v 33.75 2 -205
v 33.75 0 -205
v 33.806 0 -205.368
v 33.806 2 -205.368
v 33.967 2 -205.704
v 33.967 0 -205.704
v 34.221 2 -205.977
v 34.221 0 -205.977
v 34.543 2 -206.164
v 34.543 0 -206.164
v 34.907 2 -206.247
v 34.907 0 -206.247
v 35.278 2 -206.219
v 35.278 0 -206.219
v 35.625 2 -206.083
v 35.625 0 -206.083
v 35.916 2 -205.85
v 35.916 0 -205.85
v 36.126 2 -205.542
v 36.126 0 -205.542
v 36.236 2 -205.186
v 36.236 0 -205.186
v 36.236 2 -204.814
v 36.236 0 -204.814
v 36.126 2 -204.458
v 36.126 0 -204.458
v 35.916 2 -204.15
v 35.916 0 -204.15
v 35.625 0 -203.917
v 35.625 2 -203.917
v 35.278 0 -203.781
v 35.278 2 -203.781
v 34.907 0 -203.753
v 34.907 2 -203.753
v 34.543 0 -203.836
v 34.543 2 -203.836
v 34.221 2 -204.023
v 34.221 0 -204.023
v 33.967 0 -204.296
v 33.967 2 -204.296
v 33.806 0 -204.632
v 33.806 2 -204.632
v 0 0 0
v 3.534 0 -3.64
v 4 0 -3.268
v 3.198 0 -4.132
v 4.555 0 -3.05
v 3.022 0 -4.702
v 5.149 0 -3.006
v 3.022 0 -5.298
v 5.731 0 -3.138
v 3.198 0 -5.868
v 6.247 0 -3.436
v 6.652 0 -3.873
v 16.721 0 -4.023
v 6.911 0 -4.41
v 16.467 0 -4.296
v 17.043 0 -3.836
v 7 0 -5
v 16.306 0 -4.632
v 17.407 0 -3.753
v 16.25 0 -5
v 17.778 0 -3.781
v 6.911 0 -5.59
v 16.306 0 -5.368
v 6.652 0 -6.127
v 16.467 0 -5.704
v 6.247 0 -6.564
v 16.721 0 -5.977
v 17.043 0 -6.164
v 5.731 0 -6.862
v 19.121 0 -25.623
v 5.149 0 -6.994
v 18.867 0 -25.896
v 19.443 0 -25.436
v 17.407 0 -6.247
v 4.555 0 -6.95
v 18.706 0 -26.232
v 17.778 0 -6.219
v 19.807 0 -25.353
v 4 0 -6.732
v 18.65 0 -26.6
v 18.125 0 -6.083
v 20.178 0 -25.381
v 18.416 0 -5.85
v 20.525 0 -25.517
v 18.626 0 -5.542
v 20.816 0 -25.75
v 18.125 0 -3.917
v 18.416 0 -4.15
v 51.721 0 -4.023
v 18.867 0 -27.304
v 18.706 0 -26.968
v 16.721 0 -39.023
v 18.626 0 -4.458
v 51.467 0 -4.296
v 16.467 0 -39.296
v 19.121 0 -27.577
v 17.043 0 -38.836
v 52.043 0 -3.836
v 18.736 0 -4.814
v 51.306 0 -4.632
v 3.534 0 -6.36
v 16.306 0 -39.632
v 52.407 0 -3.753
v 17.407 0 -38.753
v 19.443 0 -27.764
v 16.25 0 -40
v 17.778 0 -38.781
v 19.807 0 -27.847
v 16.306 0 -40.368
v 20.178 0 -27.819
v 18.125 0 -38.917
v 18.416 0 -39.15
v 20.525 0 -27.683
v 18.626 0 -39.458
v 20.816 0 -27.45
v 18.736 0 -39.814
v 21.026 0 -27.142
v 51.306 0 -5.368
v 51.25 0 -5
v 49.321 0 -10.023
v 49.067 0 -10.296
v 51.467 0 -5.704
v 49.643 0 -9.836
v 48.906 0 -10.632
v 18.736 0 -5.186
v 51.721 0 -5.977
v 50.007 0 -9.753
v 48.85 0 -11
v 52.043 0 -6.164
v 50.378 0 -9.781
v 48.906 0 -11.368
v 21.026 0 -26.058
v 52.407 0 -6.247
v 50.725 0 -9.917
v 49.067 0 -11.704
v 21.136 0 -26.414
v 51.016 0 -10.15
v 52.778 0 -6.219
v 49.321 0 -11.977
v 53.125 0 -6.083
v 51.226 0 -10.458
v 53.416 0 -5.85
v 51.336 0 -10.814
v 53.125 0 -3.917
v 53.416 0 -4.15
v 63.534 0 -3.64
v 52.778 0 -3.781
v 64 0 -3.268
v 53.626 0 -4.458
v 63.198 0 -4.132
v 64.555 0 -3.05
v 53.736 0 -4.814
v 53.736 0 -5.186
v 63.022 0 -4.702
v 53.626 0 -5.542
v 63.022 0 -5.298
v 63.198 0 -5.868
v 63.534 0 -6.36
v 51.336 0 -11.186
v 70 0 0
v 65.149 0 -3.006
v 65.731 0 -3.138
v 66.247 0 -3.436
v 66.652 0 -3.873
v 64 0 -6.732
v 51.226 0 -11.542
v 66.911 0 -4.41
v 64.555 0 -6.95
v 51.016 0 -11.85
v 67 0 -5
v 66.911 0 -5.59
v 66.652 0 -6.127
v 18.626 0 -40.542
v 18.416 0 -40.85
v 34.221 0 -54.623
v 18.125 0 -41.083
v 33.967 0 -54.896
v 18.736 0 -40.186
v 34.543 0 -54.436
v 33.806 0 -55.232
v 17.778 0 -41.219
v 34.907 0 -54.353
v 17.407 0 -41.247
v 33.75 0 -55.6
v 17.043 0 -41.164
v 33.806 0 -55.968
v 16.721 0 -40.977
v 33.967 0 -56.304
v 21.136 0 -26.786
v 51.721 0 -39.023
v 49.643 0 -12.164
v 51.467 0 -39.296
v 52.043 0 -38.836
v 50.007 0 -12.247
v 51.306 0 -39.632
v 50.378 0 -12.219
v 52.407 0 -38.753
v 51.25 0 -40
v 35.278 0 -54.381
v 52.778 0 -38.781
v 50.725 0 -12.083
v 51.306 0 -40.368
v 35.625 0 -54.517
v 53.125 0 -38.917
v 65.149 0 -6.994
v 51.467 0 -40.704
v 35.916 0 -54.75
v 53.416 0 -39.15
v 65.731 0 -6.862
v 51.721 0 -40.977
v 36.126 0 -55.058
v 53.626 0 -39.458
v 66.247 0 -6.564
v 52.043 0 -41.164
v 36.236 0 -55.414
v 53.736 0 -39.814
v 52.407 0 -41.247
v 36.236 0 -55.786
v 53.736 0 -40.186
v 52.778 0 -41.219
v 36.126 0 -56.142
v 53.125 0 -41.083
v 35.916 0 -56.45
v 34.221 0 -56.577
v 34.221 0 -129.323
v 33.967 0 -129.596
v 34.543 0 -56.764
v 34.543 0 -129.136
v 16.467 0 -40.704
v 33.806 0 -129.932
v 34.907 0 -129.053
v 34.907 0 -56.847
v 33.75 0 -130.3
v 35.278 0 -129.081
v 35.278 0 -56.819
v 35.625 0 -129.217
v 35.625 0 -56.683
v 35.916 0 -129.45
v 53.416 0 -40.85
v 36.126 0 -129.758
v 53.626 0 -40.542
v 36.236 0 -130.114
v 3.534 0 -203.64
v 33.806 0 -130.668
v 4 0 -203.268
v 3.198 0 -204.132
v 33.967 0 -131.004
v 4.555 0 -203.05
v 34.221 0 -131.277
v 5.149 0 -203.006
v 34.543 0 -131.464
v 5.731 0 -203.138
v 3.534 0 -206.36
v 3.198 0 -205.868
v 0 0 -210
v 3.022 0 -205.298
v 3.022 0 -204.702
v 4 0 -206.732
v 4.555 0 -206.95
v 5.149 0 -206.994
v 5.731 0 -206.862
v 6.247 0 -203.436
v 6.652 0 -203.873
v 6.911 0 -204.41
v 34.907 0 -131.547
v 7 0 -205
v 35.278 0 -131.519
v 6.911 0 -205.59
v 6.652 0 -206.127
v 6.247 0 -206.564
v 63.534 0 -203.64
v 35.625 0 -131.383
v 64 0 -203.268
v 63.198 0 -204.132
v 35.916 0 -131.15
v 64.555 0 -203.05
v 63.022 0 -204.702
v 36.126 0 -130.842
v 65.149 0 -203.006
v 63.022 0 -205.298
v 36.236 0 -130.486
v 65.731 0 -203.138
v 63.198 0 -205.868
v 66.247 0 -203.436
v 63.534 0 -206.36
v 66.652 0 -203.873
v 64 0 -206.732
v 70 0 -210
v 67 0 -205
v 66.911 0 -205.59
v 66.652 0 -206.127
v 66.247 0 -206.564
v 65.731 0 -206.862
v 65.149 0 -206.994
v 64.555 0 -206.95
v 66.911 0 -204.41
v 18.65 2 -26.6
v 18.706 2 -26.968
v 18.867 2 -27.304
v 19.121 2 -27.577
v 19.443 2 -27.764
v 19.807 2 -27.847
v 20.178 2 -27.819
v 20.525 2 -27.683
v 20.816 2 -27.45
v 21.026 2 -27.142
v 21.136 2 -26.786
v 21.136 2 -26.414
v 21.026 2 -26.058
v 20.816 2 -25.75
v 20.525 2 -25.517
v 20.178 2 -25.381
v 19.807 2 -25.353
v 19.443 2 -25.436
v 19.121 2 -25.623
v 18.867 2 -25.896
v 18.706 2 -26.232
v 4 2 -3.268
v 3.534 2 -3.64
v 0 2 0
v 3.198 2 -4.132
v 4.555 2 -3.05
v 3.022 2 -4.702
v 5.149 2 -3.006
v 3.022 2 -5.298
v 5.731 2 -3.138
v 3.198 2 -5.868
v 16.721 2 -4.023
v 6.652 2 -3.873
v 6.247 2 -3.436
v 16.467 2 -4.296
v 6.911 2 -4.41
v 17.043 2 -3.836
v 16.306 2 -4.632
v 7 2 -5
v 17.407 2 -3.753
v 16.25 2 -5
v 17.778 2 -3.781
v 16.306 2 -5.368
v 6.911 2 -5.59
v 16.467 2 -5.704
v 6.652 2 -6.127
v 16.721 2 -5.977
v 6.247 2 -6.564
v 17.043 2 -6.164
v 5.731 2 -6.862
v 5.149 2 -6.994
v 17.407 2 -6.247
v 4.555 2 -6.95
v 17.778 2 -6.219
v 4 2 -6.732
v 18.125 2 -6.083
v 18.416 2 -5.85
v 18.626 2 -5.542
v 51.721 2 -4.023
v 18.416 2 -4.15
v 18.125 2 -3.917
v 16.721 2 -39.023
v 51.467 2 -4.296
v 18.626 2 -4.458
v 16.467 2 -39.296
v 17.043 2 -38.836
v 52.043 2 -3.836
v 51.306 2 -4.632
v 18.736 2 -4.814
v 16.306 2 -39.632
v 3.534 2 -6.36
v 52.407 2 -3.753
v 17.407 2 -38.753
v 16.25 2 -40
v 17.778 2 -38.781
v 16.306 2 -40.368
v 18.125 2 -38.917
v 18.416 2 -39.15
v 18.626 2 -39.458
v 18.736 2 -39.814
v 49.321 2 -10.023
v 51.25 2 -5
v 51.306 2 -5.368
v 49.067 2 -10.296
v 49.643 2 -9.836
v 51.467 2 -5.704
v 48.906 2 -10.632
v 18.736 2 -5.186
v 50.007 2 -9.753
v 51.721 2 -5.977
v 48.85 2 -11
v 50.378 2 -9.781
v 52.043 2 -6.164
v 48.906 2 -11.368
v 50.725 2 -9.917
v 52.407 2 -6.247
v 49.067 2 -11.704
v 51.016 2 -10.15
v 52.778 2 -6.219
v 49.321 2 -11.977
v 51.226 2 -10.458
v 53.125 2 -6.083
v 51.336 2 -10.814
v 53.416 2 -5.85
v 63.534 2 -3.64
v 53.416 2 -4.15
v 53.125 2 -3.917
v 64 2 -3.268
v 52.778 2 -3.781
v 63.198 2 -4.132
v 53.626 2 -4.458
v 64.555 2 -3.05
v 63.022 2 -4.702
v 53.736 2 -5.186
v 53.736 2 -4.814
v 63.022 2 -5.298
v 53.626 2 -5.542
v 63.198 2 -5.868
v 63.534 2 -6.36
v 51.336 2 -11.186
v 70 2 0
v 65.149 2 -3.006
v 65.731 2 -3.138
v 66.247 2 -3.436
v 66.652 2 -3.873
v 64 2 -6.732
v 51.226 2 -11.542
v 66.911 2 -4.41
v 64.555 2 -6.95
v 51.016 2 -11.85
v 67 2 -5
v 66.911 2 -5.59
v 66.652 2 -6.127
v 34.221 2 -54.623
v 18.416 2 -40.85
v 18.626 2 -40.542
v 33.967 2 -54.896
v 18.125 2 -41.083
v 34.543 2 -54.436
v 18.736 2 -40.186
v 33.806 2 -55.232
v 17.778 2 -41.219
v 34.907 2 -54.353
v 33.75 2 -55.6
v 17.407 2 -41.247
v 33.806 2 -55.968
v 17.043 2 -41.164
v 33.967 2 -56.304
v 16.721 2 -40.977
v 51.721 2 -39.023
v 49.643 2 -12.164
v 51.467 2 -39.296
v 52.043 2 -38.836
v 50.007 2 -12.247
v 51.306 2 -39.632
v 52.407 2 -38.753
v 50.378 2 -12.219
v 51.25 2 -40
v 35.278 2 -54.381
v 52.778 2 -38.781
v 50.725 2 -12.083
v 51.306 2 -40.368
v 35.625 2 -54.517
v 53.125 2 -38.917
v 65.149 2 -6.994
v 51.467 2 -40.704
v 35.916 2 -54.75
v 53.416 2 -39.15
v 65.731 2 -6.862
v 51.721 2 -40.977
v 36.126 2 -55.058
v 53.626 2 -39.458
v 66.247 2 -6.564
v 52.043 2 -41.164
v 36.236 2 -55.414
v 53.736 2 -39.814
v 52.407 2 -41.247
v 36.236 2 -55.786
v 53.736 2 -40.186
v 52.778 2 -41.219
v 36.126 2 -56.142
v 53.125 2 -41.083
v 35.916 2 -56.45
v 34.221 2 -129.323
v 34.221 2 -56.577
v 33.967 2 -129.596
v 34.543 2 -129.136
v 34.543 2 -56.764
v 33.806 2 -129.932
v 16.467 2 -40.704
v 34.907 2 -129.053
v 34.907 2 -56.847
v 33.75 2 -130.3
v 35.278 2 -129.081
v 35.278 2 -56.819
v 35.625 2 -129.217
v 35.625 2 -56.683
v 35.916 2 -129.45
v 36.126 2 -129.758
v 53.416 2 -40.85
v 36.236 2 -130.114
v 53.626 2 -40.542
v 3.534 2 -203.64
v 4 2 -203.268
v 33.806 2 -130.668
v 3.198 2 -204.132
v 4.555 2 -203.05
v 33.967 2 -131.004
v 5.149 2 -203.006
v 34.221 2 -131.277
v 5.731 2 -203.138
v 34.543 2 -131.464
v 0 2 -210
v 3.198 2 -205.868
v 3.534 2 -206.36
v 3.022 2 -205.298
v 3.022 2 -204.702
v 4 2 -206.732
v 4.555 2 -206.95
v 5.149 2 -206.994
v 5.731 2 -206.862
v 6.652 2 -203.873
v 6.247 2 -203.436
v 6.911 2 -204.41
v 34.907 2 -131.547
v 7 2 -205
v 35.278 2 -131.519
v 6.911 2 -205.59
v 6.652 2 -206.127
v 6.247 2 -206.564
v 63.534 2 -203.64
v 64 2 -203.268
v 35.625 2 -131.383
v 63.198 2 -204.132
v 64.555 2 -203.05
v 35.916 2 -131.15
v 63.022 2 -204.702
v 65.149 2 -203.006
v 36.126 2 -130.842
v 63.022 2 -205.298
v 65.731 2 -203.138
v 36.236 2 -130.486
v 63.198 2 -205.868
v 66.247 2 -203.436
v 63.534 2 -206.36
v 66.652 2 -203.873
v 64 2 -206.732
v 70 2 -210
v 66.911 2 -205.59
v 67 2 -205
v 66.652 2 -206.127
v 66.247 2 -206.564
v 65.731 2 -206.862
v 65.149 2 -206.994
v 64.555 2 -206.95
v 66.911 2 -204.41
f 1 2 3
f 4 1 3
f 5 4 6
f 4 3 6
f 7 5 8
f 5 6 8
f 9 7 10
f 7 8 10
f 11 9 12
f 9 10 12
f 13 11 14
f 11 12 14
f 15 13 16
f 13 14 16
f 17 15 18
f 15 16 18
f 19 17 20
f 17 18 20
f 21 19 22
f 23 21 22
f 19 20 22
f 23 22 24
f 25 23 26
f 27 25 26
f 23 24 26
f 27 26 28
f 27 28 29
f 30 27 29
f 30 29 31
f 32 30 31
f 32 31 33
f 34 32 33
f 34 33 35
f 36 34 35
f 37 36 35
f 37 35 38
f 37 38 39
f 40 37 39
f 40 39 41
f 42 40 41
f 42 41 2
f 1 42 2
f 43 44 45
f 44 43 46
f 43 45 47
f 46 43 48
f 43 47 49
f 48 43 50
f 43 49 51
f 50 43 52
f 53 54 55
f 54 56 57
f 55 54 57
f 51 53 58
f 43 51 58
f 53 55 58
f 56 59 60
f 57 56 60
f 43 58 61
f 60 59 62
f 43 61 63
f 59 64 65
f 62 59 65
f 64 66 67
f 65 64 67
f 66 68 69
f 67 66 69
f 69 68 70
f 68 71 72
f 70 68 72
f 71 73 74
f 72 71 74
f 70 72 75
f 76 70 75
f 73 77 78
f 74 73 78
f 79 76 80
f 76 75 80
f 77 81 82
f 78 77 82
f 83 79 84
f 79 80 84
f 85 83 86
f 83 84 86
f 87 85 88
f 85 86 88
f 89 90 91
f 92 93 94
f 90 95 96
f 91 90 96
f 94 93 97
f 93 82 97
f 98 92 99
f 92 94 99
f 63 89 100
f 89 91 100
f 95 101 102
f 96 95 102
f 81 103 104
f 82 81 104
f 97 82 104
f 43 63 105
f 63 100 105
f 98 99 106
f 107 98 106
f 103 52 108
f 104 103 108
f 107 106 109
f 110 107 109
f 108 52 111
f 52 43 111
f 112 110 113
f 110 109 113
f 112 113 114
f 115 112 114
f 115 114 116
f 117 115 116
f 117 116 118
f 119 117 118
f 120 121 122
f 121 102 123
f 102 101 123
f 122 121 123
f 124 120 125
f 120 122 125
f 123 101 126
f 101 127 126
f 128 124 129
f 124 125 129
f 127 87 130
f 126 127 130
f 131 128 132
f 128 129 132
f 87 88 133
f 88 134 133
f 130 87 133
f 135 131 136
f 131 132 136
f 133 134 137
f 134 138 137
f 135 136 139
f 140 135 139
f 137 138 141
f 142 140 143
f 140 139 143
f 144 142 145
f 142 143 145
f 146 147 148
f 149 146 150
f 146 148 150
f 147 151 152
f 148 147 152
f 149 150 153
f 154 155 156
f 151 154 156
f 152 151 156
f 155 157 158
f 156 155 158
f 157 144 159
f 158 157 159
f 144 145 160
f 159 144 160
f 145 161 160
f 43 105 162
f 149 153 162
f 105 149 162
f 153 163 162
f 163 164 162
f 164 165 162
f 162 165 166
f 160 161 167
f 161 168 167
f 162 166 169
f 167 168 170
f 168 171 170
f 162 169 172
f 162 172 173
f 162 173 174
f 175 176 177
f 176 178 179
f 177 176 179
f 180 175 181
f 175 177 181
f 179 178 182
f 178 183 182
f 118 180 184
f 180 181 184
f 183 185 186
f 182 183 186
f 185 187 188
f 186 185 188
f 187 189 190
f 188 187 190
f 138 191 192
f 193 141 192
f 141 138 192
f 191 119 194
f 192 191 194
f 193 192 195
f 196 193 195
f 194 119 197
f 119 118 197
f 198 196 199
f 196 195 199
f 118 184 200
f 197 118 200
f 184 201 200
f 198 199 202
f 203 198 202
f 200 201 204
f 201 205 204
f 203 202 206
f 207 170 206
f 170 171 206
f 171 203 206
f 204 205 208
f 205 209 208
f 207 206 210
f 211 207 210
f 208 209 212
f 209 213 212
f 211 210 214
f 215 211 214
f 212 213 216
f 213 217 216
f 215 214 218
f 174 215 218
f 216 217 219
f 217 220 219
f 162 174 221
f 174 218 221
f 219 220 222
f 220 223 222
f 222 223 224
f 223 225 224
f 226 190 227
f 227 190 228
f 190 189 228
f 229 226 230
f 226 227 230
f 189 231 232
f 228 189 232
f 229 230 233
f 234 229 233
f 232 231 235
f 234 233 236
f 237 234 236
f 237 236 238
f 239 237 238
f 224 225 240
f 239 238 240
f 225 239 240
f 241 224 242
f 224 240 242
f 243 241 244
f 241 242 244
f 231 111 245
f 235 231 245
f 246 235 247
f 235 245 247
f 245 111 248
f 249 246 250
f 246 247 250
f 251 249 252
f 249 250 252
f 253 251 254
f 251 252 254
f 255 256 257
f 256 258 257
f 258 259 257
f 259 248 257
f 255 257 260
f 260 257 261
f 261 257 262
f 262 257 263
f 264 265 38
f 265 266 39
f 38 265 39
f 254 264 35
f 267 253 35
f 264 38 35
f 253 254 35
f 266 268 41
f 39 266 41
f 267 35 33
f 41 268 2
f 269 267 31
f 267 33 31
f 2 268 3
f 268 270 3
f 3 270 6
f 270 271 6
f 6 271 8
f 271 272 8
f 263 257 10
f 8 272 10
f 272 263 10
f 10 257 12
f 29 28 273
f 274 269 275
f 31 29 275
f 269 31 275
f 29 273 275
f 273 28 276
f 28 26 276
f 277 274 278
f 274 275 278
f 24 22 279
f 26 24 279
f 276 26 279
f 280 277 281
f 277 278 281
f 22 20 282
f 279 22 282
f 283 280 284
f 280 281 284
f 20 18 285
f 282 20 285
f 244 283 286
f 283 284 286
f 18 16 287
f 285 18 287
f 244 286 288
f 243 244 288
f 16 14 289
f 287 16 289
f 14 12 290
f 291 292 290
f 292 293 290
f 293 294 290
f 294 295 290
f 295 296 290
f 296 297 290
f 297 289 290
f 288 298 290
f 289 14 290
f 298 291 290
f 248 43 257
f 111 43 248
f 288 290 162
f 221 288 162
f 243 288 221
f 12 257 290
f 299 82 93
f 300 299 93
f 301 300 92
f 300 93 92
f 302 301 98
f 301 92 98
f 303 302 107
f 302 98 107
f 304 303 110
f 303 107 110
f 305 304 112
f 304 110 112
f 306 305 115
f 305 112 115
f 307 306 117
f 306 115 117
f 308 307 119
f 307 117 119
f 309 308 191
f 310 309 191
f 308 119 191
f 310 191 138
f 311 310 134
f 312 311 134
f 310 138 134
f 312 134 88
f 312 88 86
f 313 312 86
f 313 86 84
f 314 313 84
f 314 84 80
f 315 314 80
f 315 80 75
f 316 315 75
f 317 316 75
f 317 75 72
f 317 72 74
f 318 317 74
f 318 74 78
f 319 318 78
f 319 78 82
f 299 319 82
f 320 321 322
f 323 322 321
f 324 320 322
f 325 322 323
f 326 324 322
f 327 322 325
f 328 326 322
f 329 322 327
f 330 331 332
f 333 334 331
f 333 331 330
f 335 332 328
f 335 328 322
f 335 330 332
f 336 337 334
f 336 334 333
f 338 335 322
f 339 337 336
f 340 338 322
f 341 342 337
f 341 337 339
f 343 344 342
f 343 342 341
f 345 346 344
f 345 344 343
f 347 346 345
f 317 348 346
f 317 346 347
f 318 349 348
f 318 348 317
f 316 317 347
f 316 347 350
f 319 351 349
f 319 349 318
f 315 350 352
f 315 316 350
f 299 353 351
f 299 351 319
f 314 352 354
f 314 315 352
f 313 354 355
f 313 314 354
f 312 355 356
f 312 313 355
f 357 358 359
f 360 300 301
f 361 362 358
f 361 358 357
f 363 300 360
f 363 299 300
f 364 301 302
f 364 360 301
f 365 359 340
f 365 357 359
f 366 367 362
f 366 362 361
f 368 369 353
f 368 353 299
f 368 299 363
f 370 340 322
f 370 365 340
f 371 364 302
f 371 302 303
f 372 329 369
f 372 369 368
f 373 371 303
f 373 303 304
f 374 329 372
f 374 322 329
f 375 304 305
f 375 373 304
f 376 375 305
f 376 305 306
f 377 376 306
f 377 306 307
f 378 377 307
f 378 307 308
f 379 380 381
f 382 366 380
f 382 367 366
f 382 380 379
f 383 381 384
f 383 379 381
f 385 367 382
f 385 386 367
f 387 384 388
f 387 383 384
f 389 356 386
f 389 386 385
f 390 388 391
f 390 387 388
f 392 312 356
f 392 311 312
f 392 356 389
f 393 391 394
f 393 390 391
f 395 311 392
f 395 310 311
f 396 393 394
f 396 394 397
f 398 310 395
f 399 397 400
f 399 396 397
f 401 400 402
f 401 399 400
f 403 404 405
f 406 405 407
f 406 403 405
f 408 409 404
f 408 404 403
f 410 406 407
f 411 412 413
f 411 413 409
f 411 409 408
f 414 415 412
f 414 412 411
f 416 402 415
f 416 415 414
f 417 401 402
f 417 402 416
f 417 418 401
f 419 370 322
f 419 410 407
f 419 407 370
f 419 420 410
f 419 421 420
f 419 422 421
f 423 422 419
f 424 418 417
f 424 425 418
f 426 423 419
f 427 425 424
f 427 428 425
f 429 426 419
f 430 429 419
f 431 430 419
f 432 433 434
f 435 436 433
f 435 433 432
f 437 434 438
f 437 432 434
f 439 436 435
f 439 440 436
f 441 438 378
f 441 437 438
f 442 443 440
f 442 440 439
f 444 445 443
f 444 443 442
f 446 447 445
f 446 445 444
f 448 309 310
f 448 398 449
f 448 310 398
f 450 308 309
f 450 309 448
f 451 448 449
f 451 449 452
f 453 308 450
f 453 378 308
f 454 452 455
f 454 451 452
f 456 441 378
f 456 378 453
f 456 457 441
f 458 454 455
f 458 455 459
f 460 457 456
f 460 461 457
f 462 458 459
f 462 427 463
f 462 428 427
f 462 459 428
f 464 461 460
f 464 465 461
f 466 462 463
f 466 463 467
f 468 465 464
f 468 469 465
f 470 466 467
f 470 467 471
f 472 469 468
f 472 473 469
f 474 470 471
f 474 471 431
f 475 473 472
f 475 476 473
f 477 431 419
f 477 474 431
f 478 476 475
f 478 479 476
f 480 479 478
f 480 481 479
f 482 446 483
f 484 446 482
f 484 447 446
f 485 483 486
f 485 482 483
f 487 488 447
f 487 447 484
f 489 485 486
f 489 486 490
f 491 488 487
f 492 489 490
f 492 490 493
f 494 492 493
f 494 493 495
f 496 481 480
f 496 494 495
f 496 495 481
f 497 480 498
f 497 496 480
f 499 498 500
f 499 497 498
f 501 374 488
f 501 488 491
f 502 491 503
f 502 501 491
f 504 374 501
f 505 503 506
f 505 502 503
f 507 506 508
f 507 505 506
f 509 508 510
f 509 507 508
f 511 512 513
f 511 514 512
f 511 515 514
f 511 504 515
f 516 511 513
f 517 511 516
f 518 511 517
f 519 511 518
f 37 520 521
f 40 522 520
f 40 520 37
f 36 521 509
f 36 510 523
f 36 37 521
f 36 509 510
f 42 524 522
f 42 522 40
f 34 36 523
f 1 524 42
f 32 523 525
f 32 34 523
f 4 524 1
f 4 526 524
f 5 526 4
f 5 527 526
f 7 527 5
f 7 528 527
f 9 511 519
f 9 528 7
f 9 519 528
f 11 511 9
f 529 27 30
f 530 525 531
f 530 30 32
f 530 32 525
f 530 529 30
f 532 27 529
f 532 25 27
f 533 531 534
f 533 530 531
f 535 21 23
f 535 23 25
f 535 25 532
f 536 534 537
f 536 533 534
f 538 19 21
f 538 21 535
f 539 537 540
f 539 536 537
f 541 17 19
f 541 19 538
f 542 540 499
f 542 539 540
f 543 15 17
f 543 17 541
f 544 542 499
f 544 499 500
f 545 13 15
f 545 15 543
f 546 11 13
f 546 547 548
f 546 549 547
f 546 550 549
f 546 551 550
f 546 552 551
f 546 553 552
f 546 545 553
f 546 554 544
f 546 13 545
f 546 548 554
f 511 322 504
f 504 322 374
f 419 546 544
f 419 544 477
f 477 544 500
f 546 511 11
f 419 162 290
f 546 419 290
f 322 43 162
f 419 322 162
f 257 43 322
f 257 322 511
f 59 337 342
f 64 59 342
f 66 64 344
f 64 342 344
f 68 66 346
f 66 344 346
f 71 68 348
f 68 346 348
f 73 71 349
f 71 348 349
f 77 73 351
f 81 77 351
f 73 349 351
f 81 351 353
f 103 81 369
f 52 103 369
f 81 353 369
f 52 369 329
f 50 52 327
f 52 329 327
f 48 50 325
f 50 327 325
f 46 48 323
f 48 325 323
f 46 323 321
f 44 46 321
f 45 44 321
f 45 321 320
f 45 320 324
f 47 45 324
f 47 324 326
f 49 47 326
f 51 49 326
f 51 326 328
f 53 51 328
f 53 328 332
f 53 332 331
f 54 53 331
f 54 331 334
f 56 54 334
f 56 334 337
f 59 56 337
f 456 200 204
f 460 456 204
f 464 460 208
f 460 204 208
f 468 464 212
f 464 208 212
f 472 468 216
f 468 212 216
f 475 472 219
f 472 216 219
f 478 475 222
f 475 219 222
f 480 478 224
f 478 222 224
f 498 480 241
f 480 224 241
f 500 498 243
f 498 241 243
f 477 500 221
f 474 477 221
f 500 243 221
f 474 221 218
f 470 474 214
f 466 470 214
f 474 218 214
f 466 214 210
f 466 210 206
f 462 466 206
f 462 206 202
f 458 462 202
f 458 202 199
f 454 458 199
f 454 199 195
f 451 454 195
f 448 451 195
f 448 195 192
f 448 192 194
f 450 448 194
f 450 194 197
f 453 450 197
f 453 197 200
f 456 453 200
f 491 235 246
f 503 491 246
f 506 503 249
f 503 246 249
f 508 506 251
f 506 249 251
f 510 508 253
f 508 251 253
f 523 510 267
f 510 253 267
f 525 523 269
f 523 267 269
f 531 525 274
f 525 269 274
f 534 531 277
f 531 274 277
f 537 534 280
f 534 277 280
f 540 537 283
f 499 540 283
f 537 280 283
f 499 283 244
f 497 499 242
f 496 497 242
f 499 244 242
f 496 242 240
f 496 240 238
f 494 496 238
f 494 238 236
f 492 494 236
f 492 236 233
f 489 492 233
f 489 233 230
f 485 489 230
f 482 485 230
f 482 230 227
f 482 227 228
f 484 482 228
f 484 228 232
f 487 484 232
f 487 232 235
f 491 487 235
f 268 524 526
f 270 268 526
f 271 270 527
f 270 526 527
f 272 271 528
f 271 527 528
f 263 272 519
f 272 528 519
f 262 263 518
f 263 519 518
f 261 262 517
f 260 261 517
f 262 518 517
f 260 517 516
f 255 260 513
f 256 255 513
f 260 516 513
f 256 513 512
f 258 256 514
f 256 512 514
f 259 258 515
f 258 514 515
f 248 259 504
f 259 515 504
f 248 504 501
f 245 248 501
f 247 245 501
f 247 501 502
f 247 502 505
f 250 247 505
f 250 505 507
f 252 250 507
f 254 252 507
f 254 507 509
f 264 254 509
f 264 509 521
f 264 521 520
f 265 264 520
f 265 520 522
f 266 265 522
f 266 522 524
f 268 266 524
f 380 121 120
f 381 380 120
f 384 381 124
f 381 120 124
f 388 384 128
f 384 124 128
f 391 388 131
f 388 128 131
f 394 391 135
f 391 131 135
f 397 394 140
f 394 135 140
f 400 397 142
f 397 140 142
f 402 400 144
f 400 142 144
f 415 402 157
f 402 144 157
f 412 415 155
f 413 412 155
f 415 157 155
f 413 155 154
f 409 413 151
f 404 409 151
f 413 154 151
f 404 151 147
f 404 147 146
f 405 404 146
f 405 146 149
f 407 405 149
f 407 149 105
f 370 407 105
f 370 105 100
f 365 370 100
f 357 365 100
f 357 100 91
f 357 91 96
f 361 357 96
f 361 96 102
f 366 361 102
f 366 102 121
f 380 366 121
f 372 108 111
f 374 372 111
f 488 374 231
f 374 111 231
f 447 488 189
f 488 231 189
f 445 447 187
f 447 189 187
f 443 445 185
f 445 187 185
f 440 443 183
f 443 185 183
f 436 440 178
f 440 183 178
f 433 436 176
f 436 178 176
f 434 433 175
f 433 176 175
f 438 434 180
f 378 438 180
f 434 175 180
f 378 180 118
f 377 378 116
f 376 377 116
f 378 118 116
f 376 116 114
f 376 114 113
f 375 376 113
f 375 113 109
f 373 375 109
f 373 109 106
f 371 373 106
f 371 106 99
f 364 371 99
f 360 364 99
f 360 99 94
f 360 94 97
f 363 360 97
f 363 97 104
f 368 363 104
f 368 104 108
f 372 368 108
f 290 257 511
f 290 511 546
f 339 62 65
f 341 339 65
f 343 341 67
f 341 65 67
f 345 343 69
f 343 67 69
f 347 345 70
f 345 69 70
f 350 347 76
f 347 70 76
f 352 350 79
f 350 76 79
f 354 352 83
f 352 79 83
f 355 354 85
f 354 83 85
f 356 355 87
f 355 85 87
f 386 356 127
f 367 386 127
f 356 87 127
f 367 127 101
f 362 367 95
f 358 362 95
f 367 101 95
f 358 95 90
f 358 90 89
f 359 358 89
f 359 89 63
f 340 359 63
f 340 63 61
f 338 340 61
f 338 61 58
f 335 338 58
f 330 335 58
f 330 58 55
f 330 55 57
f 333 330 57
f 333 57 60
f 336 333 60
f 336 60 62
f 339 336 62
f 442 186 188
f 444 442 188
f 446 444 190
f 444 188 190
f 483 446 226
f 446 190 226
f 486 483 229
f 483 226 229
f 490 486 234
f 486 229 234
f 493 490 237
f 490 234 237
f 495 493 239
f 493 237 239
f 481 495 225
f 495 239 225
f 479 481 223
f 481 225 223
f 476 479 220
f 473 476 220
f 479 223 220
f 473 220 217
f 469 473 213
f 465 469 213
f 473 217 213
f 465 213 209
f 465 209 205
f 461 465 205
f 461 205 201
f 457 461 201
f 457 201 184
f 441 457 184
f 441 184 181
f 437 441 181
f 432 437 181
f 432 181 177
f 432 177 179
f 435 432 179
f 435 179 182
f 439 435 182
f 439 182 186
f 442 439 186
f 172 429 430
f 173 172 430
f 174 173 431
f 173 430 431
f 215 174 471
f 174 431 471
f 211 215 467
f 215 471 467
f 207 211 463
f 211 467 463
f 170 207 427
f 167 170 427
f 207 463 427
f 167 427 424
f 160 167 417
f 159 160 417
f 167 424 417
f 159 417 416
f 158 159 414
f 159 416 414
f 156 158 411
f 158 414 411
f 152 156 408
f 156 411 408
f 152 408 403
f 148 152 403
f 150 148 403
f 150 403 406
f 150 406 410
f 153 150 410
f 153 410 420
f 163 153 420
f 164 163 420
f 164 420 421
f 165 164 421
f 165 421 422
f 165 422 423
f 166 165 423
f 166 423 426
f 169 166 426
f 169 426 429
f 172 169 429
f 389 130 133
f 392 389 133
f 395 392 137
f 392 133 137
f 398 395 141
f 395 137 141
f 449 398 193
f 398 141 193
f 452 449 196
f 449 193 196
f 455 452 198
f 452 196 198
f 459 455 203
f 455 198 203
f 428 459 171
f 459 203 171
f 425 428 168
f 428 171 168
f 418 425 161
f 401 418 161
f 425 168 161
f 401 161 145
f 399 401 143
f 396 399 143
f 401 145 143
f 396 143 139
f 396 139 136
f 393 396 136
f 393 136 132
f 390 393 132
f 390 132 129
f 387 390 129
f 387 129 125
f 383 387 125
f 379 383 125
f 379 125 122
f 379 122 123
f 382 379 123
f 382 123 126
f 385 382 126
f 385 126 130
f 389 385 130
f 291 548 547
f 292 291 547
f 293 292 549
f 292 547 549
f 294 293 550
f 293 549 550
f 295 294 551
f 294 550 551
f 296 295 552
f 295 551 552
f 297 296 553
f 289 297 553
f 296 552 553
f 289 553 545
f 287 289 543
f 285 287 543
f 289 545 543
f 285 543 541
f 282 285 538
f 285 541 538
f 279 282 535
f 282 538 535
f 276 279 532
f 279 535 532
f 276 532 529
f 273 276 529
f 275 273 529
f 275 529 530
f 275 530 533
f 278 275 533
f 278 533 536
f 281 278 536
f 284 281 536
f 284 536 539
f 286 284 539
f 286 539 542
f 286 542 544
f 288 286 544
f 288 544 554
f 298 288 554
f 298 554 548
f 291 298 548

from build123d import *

# Parameters (mm, degrees)
SKETCH1_W               = 70
SKETCH1_H               = 210
BOSS_EXTRUDE1_DEPTH     = 2
SKETCH2_R               = 2
CUT_EXTRUDE1_DEPTH      = 3
TAP_DRILL_FOR_M3_TAP1_D = 2.5
TAP_DRILL_FOR_M3_TAP2_D = 2.5
TAP_DRILL_FOR_M3_TAP3_D = 2.5


with BuildPart() as part:
    # Sketch1 → Boss-Extrude1 (new body)
    with BuildSketch(Plane(origin=(0, 0, 0), x_dir=(1, 0, 0), z_dir=(0, 1, 0))):
        with Locations((35, 105)):
            Rectangle(SKETCH1_W, SKETCH1_H)
    extrude(amount=BOSS_EXTRUDE1_DEPTH)

    # Sketch2 → Cut-Extrude1 (cut, through all)
    with BuildSketch(Plane(origin=(0, 2, 0), x_dir=(1, 0, 0), z_dir=(0, 1, 0))):
        with Locations((5, 205)):
            Circle(SKETCH2_R)
        with Locations((65, 205)):
            Circle(SKETCH2_R)
        with Locations((65, 5)):
            Circle(SKETCH2_R)
        with Locations((5, 5)):
            Circle(SKETCH2_R)
    extrude(amount=-CUT_EXTRUDE1_DEPTH, mode=Mode.SUBTRACT)

    # Tap Drill for M3 Tap1 (through all)
    with Locations(Plane(origin=(0, 2, 0), x_dir=(1, 0, 0), z_dir=(0, 1, 0))):
        with Locations((35, 205), (35, 130.3), (35, 55.6)):
            Hole(TAP_DRILL_FOR_M3_TAP1_D / 2)

    # Tap Drill for M3 Tap2 (through all)
    with Locations(Plane(origin=(0, 2, 0), x_dir=(1, 0, 0), z_dir=(0, 1, 0))):
        with Locations((52.5, 5), (17.5, 5), (17.5, 40), (52.5, 40)):
            Hole(TAP_DRILL_FOR_M3_TAP2_D / 2)

    # Tap Drill for M3 Tap3 (through all)
    with Locations(Plane(origin=(0, 2, 0), x_dir=(1, 0, 0), z_dir=(0, 1, 0))):
        with Locations((19.9, 26.6), (50.1, 11)):
            Hole(TAP_DRILL_FOR_M3_TAP3_D / 2)


solid = part.part
